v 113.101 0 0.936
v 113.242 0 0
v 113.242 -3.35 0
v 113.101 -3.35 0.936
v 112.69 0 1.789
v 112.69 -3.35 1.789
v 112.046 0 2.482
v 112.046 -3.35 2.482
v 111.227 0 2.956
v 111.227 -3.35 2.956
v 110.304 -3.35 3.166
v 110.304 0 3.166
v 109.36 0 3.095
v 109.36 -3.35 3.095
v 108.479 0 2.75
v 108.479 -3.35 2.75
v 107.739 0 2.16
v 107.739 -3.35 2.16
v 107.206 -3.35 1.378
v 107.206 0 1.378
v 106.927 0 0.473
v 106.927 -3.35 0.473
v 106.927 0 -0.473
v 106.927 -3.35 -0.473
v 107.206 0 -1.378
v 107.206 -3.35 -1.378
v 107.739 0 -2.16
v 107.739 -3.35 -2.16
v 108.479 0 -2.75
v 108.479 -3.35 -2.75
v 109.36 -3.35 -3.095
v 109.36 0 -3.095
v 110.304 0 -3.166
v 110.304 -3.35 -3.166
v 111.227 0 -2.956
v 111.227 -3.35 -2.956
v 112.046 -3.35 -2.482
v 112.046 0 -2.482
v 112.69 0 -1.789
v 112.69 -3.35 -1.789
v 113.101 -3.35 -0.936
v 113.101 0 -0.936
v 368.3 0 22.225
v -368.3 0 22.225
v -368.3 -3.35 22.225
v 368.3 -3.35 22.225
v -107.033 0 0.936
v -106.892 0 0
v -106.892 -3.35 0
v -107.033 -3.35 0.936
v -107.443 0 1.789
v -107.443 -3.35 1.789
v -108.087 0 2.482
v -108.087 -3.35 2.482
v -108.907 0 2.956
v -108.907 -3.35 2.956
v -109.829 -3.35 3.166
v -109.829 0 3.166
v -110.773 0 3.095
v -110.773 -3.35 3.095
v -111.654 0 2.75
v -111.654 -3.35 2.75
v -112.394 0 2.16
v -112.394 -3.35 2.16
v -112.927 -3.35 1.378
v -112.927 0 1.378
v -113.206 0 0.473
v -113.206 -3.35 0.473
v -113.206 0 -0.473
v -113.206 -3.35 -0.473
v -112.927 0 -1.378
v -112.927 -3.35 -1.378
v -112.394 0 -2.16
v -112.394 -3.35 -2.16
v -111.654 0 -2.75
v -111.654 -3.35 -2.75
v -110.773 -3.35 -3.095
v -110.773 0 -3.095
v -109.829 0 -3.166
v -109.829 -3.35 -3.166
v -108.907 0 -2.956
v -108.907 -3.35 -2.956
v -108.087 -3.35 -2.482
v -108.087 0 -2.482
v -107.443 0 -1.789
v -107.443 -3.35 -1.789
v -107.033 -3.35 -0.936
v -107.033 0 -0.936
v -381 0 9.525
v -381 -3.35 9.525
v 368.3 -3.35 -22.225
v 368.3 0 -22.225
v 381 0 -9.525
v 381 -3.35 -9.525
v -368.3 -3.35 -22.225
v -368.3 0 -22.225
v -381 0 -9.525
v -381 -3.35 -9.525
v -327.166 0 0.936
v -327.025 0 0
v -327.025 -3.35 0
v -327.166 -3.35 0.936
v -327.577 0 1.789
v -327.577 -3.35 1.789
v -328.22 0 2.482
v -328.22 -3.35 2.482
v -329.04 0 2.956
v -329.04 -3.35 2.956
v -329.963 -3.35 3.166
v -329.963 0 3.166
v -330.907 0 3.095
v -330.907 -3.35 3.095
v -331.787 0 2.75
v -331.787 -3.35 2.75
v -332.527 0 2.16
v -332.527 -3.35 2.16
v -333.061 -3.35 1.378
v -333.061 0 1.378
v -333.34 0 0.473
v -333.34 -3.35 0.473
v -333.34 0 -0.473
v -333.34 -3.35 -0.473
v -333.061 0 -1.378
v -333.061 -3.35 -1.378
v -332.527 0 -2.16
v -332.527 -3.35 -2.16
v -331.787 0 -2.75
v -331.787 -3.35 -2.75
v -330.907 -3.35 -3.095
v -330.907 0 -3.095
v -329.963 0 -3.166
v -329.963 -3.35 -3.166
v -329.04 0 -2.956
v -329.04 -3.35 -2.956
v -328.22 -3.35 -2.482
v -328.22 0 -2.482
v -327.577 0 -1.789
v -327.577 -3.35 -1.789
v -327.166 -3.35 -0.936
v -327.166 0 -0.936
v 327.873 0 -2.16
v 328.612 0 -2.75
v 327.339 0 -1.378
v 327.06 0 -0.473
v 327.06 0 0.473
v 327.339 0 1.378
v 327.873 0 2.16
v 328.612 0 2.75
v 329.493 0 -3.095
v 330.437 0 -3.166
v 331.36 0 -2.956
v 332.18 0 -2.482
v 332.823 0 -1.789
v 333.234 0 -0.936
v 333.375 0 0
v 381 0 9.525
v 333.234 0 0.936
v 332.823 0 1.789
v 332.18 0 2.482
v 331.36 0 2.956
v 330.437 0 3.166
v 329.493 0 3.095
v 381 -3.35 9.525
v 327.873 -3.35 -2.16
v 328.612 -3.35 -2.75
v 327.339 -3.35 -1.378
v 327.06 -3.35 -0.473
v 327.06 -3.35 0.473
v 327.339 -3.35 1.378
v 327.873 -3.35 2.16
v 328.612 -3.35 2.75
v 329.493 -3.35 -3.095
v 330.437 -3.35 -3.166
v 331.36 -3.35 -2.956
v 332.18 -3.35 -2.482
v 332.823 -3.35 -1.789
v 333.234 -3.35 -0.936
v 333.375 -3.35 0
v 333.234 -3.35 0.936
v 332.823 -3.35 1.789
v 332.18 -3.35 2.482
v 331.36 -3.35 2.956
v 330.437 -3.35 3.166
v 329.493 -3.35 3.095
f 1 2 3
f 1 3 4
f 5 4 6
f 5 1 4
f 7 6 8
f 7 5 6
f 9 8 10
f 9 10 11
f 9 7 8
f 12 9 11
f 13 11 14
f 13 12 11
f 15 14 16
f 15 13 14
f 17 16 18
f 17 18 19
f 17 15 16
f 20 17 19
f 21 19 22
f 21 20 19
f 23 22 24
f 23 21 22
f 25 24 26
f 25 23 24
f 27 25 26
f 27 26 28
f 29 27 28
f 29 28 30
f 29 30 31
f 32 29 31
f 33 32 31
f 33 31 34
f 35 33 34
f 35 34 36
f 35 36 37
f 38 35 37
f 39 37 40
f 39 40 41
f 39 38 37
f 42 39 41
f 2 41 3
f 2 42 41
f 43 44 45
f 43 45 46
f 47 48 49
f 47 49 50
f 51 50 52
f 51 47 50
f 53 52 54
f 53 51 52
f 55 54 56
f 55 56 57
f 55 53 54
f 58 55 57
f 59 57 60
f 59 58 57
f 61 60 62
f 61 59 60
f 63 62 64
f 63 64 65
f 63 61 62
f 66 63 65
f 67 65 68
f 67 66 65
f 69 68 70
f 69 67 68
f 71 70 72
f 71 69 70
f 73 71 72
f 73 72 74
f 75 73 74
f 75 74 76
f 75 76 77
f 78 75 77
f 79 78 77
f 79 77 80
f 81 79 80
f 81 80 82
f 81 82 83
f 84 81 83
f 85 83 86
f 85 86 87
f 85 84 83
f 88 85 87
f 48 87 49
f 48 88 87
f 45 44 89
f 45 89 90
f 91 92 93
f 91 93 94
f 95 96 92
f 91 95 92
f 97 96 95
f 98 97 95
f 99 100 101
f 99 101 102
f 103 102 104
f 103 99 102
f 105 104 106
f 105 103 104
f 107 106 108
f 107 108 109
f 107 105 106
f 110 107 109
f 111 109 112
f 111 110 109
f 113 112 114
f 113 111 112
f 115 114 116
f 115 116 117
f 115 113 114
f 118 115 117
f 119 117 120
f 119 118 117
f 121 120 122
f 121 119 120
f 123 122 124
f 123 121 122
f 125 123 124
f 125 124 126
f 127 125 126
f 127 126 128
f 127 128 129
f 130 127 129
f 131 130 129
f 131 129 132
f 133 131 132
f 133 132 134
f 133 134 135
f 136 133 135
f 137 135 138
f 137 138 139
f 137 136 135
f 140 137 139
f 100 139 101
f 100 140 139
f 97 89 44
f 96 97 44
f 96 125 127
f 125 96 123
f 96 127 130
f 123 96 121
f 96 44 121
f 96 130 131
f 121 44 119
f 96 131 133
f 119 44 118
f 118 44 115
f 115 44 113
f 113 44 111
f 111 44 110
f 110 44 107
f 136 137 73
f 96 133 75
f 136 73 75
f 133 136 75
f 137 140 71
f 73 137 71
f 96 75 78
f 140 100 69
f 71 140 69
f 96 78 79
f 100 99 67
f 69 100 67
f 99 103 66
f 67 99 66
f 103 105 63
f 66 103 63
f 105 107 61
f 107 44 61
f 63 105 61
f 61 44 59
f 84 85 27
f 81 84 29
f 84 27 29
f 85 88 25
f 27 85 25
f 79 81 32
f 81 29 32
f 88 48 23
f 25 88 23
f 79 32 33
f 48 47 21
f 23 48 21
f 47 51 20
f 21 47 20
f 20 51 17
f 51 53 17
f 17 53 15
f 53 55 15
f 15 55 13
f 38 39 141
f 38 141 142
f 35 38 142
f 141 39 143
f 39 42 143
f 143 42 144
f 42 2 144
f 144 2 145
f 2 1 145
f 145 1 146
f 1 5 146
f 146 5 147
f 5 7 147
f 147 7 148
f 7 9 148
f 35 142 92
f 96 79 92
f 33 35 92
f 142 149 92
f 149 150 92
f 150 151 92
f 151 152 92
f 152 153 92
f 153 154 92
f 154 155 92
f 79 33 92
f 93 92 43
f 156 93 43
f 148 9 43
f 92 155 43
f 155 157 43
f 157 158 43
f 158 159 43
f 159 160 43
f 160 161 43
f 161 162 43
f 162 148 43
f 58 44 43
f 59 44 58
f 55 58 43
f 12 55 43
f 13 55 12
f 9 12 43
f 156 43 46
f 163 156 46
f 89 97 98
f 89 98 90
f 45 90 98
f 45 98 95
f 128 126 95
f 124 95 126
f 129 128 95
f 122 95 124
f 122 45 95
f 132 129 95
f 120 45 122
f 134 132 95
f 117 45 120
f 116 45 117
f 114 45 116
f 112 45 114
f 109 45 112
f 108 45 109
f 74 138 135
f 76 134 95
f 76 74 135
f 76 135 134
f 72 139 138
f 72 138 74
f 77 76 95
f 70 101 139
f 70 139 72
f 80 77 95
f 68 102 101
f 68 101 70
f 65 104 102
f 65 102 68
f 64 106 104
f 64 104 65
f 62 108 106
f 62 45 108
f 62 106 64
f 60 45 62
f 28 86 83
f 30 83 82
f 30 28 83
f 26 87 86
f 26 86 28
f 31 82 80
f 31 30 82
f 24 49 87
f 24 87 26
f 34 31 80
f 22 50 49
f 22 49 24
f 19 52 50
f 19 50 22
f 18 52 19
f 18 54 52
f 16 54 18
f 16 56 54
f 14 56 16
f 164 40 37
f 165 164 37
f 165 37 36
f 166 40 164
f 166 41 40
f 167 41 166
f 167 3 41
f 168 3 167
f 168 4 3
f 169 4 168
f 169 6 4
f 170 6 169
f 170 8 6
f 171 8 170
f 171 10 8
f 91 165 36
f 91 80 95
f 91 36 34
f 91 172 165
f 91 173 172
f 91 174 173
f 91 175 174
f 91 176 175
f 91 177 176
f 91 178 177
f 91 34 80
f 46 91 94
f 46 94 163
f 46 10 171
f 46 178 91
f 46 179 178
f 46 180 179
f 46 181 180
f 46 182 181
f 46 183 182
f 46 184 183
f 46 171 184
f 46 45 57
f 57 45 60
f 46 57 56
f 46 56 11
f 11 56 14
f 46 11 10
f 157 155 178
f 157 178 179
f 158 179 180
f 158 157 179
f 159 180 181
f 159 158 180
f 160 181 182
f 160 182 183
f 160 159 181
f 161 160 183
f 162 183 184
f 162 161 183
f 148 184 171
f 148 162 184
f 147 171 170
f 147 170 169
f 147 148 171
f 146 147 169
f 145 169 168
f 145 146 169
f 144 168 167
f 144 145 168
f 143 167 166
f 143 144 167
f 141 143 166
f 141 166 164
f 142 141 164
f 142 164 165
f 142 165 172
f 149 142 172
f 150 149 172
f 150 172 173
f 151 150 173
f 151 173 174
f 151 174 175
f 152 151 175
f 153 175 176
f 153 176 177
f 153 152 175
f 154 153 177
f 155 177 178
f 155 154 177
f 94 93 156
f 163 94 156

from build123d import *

# Parameters (mm, degrees)
F0_W     = 762
F0_H     = 44.45
F0_R     = 3.175
F1_DEPTH = 3.35
F2_SIZE  = 12.7


with BuildPart() as f1:
    # F0 (on Front) → F1 (new body)
    with BuildSketch(Plane.XZ):
        Rectangle(F0_W, F0_H)
        with Locations((-330.2, 0)):
            Circle(F0_R, mode=Mode.SUBTRACT)
        with Locations((-110.066667, 0)):
            Circle(F0_R, mode=Mode.SUBTRACT)
        with Locations((110.066667, 0)):
            Circle(F0_R, mode=Mode.SUBTRACT)
        with Locations((330.2, 0)):
            Circle(F0_R, mode=Mode.SUBTRACT)
    extrude(amount=F1_DEPTH)

    # F2
    f2_edges = [f1.edges().sort_by_distance(p)[0] for p in [
        (381, -1.675, -22.225),
        (381, -1.675, 22.225),
        (-381, -1.675, 22.225),
        (-381, -1.675, -22.225),
    ]]
    chamfer(f2_edges, length=F2_SIZE)


solid = f1.part
